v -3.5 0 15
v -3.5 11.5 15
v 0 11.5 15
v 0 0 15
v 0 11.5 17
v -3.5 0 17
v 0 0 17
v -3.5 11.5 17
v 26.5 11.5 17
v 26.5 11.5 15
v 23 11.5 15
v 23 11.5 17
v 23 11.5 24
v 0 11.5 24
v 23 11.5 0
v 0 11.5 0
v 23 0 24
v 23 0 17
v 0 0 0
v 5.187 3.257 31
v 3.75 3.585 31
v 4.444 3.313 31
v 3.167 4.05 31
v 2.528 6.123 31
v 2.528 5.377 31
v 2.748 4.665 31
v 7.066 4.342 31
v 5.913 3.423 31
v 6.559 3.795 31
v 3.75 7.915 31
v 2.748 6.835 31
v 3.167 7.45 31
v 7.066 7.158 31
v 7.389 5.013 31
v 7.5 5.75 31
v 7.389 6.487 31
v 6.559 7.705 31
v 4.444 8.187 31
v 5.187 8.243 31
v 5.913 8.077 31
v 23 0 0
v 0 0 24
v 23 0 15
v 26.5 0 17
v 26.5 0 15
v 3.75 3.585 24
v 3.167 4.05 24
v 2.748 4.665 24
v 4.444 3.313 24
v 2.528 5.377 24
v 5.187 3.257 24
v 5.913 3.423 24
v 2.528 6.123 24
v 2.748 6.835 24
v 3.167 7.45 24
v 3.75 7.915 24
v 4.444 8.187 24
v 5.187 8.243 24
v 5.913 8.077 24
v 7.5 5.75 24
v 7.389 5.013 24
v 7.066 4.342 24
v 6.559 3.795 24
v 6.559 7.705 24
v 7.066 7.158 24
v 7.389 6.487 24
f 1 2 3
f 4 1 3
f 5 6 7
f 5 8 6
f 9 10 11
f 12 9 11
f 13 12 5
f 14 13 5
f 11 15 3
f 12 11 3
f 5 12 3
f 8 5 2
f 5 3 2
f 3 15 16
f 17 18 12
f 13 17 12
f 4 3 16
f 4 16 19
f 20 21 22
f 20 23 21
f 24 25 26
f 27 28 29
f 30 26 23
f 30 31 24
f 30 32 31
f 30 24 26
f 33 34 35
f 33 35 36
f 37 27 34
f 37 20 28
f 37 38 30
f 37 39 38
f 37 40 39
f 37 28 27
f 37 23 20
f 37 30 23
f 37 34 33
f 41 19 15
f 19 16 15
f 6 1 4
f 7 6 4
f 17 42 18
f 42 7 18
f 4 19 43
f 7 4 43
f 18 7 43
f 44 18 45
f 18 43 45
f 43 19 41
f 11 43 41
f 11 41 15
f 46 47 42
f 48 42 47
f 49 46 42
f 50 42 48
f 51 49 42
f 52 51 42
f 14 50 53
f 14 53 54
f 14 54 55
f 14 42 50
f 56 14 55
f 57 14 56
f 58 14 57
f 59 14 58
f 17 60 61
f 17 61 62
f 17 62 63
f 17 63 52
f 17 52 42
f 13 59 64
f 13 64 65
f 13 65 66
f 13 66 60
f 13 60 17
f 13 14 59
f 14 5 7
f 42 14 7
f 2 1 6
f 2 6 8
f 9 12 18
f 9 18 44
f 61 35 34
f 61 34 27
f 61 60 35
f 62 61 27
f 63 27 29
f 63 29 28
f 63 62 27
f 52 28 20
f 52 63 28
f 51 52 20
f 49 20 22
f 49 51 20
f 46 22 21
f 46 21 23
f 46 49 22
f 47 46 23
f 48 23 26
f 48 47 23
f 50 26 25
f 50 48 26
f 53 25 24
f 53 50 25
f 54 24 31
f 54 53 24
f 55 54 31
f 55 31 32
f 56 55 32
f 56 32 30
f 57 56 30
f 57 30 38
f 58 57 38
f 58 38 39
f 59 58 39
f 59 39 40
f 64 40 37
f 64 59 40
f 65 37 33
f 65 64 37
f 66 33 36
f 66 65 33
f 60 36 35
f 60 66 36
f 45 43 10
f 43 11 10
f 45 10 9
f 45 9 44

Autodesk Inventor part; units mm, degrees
ref_plane "YZ Plane" through (0, 0, 0) normal (1, 0, 0) x (0, 1, 0)
ref_plane "XZ Plane" through (0, 0, 0) normal (0, 1, 0) x (-1, 0, 0)
ref_plane "XY Plane" through (0, 0, 0) normal (0, 0, 1) x (1, 0, 0)
sketch "Sketch1" plane through (0, 0, 0) normal (0, 0, 1) x (1, 0, 0)
  line L0 (0, 0) -> (23, 0)
  line L1 (23, 0) -> (23, 11.5)
  line L2 (23, 11.5) -> (0, 11.5)
  line L3 (0, 11.5) -> (0, 0)
  dimension "d0" = 23
  dimension "d1" = 11.5
extrude "Extrusion1" add sketch "Sketch1" along normal blind 15
sketch "Sketch2" plane through (0, 0, 15) normal (0, 0, 1) x (1, 0, 0)
  line L0 (23, 11.5) -> (0, 11.5) projected
  line L1 (0, 11.5) -> (-3.5, 11.5)
  line L2 (-3.5, 11.5) -> (26.5, 11.5)
  line L3 (26.5, 11.5) -> (26.5, 0)
  line L4 (26.5, 0) -> (-3.5, 0)
  line L5 (-3.5, 0) -> (-3.5, 11.5)
  point P0 (0, 0)
  dimension "d4" = 3.5
  dimension "d5" = 30
extrude "Extrusion2" add sketch "Sketch2" along normal blind 2
sketch "Sketch3" plane through (0, 0, 17) normal (0, 0, 1) x (1, 0, 0)
  line L0 (0, 11.5) -> (0, 0) projected
  line L1 (23, 0) -> (23, 11.5) projected
  line L2 (0, 11.5) -> (23, 11.5)
  line L3 (23, 11.5) -> (23, 0)
  line L4 (23, 0) -> (0, 0)
  line L5 (0, 0) -> (0, 11.5)
extrude "Extrusion3" add sketch "Sketch3" along normal blind 7
sketch "Sketch4" plane through (0, 0, 24) normal (0, 0, 1) x (1, 0, 0)
  line L0 (0, 11.5) -> (0, 0) projected
  line L1 (0, 5.75) -> (5, 5.75)
  circle A0 centre (5, 5.75) radius 2.5
  dimension "d10" = 5
  dimension "d11" = 5
extrude "Extrusion4" add sketch "Sketch4" along normal blind 7
properties part number "AilServoRep"
